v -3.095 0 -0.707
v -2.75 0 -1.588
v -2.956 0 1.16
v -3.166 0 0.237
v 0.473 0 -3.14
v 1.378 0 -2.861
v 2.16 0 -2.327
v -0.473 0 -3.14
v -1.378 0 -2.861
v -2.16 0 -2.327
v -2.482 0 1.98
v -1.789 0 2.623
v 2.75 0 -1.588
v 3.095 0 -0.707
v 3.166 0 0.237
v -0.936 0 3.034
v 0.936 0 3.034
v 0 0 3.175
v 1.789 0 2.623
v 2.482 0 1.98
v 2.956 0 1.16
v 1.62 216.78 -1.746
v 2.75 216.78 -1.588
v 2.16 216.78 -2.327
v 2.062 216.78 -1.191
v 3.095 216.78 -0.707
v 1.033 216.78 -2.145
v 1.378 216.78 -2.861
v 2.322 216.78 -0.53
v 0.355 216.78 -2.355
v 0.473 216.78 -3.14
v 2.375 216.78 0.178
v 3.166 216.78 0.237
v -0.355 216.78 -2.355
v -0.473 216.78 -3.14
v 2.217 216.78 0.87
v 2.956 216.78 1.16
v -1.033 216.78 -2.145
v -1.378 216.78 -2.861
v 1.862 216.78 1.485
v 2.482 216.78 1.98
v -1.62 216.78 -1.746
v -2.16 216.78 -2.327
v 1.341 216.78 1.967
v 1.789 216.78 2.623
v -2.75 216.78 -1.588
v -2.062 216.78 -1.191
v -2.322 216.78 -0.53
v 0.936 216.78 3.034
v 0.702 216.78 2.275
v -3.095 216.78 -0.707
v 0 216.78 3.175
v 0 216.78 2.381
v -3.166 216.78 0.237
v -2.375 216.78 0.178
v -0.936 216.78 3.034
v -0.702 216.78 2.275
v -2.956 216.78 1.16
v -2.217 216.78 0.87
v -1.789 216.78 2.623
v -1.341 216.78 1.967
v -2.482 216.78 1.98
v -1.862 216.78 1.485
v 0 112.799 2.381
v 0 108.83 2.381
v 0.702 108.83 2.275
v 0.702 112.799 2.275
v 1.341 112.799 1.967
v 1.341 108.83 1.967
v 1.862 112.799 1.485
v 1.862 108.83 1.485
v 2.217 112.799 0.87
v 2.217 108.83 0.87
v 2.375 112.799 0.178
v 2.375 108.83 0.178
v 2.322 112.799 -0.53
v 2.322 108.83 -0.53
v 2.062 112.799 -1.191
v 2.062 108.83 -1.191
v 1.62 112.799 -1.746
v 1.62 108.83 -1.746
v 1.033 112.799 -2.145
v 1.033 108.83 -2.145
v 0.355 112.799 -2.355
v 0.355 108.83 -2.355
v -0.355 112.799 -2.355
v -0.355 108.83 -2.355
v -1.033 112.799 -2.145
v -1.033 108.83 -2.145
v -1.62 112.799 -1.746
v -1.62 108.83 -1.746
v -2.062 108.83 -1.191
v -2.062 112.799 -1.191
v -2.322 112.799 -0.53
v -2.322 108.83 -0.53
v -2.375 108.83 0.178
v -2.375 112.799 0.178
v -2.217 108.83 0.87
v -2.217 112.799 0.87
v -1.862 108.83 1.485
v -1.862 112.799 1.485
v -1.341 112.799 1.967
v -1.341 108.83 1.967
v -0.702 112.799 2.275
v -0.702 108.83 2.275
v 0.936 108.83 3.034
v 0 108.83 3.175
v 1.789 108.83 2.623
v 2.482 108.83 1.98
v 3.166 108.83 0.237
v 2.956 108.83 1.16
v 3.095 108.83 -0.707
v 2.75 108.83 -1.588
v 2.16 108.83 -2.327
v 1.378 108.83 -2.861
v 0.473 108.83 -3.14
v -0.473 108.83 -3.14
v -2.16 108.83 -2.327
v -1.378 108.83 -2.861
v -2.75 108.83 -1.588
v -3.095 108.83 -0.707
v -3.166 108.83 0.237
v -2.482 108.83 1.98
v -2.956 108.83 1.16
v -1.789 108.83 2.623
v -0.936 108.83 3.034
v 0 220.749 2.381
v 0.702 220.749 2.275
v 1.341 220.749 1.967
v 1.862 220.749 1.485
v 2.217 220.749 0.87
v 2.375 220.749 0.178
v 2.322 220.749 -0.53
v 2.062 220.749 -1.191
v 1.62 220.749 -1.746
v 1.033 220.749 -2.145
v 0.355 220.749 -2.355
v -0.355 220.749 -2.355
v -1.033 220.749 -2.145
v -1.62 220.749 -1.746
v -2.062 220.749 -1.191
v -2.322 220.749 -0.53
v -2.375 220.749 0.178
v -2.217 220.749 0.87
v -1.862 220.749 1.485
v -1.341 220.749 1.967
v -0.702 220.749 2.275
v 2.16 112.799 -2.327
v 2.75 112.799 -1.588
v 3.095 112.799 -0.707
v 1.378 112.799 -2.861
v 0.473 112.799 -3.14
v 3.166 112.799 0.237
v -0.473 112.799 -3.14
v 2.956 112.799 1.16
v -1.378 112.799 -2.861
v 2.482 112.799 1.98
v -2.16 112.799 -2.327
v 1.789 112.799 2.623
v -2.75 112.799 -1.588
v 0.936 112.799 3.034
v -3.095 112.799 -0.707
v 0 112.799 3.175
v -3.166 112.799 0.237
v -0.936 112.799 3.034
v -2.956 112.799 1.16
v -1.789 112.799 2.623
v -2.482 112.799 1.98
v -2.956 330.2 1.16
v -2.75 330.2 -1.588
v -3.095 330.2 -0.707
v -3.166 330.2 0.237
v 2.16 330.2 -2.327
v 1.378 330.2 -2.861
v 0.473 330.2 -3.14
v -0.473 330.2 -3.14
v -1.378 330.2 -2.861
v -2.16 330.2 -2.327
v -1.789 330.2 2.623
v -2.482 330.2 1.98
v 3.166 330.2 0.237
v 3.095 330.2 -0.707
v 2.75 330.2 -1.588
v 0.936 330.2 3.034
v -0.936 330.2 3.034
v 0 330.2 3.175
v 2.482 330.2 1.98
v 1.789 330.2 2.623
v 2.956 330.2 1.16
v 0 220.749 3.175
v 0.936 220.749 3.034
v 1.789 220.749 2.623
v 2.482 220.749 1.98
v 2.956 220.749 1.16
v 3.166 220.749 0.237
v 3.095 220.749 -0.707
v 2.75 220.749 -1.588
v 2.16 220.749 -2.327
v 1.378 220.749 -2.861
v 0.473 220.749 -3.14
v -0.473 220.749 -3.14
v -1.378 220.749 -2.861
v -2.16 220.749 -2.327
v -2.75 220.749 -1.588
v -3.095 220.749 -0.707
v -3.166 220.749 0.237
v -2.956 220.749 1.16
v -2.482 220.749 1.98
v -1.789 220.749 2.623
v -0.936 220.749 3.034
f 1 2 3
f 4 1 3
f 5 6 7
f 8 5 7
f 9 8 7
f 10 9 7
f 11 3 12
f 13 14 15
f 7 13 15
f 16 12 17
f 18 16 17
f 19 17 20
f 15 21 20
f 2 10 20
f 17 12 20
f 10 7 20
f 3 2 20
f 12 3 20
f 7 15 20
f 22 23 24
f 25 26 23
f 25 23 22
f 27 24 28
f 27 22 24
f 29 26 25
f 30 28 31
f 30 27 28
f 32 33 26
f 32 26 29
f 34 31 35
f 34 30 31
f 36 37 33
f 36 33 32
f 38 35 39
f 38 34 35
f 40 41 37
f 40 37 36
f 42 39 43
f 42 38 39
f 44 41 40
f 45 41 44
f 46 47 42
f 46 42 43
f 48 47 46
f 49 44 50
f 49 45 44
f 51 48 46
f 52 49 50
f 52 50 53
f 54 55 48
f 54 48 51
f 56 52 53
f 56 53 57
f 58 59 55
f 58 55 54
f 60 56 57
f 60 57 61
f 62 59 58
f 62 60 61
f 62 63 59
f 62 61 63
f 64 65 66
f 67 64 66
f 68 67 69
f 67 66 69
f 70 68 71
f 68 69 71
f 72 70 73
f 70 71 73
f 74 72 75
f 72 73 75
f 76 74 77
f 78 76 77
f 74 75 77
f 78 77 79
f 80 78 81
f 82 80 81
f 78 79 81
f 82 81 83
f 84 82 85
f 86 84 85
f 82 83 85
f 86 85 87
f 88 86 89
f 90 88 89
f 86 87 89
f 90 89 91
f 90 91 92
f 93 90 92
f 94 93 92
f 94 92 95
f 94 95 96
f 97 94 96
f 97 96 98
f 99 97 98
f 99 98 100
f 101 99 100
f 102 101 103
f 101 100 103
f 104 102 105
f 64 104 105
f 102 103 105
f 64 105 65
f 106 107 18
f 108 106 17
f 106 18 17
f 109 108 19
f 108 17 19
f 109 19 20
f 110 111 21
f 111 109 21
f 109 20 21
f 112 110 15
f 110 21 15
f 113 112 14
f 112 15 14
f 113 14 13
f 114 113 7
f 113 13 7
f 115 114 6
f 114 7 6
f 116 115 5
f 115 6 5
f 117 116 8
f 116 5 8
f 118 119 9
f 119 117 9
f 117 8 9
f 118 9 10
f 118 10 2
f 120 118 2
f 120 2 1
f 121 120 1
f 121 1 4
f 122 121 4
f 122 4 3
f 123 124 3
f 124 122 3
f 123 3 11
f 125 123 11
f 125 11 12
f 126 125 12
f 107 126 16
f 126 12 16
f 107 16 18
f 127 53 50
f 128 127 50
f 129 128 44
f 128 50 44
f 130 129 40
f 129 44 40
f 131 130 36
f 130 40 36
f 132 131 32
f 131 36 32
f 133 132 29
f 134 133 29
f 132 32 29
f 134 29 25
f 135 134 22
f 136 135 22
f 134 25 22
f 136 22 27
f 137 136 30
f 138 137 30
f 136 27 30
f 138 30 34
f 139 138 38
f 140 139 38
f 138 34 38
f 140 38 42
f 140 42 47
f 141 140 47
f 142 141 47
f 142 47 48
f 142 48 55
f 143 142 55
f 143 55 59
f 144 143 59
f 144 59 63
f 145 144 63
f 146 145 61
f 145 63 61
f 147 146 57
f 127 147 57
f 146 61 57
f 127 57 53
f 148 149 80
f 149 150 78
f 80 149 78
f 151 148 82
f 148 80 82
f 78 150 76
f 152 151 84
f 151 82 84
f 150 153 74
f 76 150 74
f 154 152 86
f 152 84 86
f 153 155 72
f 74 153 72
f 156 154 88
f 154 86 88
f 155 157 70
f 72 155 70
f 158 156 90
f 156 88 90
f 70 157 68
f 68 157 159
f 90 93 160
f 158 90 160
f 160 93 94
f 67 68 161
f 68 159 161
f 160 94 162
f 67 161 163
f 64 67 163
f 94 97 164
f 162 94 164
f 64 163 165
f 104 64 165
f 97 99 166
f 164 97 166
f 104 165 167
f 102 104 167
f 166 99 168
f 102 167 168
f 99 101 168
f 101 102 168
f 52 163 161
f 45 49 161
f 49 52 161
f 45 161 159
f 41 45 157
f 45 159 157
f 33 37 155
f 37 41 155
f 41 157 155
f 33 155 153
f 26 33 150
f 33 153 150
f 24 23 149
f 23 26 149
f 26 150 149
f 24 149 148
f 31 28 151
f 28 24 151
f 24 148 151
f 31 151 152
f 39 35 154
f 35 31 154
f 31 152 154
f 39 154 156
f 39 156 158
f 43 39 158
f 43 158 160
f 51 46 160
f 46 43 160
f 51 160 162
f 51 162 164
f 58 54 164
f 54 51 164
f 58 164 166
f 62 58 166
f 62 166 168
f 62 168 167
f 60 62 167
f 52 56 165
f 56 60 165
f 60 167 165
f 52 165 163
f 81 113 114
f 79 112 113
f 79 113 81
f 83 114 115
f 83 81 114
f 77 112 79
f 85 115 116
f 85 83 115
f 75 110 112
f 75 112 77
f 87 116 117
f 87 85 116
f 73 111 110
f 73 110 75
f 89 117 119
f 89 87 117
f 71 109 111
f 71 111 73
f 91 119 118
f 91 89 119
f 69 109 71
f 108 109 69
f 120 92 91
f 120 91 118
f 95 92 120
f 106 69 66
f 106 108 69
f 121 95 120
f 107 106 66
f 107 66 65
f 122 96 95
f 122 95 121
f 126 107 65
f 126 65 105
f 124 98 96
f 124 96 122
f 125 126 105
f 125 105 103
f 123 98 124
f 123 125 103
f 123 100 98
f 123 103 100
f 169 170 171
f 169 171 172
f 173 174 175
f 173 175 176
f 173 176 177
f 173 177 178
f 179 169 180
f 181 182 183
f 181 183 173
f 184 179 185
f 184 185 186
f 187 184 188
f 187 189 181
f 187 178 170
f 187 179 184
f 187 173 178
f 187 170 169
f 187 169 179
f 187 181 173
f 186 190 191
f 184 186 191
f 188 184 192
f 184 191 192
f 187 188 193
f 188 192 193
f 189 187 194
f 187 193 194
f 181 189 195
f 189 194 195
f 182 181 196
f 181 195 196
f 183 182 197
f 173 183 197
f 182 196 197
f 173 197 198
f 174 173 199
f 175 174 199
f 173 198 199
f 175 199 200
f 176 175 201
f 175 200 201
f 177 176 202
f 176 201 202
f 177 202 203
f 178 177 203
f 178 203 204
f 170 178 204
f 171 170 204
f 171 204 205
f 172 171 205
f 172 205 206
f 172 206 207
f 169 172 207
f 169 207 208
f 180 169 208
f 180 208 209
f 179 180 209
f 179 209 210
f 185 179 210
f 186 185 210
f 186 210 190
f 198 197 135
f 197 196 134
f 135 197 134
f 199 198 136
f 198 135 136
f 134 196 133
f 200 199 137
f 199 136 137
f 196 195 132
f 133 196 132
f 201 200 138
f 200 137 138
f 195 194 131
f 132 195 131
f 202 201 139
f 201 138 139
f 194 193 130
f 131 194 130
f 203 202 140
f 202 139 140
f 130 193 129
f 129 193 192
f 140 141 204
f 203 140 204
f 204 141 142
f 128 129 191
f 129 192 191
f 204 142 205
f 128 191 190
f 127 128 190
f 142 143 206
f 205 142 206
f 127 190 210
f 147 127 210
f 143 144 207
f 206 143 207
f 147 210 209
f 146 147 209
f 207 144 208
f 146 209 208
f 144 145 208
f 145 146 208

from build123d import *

# Parameters (mm, degrees)
SKETCH1_R           = 3.175
BOSS_EXTRUDE1_DEPTH = 330.2
SKETCH2_R           = 3.4925
SKETCH2_R_2         = 2.38125
CUT_EXTRUDE1_DEPTH  = 3.96875
LPATTERN1_COUNT     = 2
LPATTERN1_PITCH     = 107.95


with BuildPart() as part:
    # Sketch1 → Boss-Extrude1 (new body)
    with BuildSketch(Plane(origin=(0, 0, 0), x_dir=(1, 0, 0), z_dir=(0, 1, 0))):
        with Locations(Location((0, 0, 0), (0, 0, 270))):  # turned: the seam where the file's is
            Circle(SKETCH1_R)
    extrude(amount=BOSS_EXTRUDE1_DEPTH)

    # Sketch2 → Cut-Extrude1 (cut)
    with BuildSketch(Plane(origin=(0, 108.83011, 0), x_dir=(-1, 0, 0), z_dir=(0, 1, 0))):
        Circle(SKETCH2_R)
        with Locations(Location((0, 0, 0), (0, 0, 90))):  # turned: the seam where the file's is
            Circle(SKETCH2_R_2, mode=Mode.SUBTRACT)
    cut_extrude1 = extrude(amount=CUT_EXTRUDE1_DEPTH, mode=Mode.SUBTRACT)

    # LPattern1: Cut-Extrude1 ×2
    with Locations(*[(0, i * LPATTERN1_PITCH, 0) for i in range(1, LPATTERN1_COUNT)]):
        add(cut_extrude1, mode=Mode.SUBTRACT)


solid = part.part
